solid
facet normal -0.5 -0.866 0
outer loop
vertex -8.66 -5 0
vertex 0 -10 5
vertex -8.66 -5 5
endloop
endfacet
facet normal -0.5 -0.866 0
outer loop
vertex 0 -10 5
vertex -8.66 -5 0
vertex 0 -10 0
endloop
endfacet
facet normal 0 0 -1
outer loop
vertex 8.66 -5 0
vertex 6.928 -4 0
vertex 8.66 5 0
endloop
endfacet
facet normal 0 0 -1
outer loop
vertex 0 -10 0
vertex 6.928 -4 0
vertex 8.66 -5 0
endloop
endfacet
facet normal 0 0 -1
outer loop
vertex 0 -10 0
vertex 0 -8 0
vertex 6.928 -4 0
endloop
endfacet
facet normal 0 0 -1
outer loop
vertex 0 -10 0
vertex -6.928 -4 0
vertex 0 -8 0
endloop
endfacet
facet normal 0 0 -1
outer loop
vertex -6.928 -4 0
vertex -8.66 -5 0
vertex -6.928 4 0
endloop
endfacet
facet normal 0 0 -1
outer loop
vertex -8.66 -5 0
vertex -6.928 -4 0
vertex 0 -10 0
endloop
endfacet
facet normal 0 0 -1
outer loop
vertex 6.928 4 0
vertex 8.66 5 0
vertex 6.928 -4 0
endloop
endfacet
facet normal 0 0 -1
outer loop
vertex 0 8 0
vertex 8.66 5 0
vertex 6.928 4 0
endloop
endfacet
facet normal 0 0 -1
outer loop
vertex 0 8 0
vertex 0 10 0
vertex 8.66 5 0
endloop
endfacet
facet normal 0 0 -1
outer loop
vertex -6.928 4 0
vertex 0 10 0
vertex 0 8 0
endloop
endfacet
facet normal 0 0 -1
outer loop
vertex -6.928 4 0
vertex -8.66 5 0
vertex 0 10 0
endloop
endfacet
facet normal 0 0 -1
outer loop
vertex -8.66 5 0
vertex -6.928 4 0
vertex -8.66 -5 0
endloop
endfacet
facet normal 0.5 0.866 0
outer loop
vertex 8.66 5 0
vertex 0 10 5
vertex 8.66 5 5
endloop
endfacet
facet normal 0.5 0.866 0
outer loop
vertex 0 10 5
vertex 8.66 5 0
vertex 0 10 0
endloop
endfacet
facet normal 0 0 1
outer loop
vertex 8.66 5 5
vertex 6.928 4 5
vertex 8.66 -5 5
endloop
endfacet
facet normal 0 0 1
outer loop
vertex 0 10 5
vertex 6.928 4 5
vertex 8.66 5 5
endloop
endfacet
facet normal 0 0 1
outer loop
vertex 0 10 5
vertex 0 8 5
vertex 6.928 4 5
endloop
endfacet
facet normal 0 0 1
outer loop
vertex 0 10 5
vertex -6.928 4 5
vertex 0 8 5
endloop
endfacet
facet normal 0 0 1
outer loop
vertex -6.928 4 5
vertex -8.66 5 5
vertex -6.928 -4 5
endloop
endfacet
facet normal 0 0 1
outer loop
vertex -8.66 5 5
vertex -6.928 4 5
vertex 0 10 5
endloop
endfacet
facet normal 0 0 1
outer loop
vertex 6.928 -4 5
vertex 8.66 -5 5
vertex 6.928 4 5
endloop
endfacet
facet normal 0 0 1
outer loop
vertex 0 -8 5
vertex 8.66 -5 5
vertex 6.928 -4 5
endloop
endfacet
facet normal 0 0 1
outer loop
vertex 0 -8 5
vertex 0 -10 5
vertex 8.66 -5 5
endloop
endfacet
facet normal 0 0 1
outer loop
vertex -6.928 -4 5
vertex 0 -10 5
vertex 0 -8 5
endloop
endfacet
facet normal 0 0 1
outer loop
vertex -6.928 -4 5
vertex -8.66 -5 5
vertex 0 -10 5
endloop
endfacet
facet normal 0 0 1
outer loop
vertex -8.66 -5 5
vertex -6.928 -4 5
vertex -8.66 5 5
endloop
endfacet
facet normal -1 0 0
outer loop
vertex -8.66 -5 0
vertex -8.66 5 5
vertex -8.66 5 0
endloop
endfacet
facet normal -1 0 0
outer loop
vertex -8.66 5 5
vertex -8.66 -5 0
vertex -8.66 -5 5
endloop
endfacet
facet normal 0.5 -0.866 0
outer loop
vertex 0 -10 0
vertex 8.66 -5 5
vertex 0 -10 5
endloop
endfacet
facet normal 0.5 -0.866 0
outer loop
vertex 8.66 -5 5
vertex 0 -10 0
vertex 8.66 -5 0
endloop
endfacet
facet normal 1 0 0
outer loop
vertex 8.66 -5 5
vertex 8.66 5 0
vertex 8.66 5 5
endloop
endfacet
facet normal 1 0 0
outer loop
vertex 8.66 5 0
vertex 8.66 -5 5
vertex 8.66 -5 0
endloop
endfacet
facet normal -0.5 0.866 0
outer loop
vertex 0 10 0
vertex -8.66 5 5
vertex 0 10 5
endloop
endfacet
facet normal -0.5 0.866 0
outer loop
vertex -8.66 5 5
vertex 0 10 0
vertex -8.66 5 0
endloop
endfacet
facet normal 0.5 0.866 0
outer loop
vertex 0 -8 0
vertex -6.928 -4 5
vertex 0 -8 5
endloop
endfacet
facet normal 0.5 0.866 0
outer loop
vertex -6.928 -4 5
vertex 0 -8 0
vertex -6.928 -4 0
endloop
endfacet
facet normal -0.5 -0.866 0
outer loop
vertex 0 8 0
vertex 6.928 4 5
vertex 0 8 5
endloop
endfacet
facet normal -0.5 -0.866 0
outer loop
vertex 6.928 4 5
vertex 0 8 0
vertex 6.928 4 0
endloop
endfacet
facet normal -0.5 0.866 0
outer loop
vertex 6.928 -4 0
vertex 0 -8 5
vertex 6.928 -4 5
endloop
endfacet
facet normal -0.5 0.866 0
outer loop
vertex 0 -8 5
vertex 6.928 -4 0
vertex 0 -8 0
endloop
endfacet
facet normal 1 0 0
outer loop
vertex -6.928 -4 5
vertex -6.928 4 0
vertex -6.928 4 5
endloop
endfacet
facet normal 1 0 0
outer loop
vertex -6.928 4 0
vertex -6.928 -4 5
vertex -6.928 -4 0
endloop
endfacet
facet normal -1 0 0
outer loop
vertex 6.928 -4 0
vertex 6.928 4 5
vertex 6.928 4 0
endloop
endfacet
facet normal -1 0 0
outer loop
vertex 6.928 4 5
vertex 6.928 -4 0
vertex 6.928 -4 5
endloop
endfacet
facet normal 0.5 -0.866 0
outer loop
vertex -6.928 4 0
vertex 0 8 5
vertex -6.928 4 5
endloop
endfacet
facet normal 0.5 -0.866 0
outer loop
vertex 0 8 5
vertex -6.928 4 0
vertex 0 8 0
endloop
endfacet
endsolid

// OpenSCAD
$fn = 100;

module hex(r, h, t) {
    difference() {
        linear_extrude(h) circle(r, $fn=6);
        translate([0, 0, -0.5]) linear_extrude(h+1) circle(r-t,$fn=6);
    }
}

r=10;
h=5;
t=2;

rotate(90) {
translate([0, 0, 0]) hex(r, h, t);
//translate([0, r*2*sin(60)-t, 0]) hex(r, h, t);
//translate([r*1.5-t*cos(60),r*sin(60)-t/2, 0]) hex(r, h, t);
}
text("8");
